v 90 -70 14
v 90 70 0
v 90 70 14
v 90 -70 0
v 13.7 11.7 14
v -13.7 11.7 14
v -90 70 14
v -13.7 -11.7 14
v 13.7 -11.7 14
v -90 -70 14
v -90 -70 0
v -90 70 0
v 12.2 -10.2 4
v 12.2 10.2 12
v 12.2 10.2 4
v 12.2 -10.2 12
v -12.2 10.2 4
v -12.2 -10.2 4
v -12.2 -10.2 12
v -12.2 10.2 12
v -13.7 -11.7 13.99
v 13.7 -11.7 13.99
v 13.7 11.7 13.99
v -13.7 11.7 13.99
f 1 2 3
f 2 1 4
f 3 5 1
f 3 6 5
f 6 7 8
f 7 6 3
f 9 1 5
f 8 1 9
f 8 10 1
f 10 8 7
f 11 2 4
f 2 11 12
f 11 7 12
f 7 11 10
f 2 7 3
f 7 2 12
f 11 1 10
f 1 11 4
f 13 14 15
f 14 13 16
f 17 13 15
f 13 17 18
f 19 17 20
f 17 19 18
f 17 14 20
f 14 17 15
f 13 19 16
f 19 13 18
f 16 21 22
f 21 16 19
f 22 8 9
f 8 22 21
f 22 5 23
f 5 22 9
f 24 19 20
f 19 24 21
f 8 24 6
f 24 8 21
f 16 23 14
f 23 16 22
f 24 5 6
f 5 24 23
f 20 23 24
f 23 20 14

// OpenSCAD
// Headphone stand: base, post, hanger. Units mm. Print orientation = export orientation (+Z up).
part = "base"; // [base, post, hanger, assembly]
cadverify_only = "";

/* Parameters */
base_L = 180; base_W = 140; base_H = 14;
base_sock_L = 24.4; base_sock_W = 20.4; base_sock_D = 10; // depth from top
base_floor = base_H - base_sock_D; // 4
base_cham_H = 2; base_cham_extra = 1.5; // per side funnel

post_low_L = 24; post_low_W = 20; post_low_H = 10;
post_flare_H = 6;
post_shaft_L = 34; post_shaft_W = 28;
post_shaft_bot = post_low_H + post_flare_H; // 16
post_shaft_top = 230;
post_shaft_H = post_shaft_top - post_shaft_bot; // 214
post_up_L = 20; post_up_W = 16; post_up_H = 12;
post_up_cham_H = 1.5; post_up_cham_extra = 1.5; // per side taper at top
post_H = post_shaft_top + post_up_H; // 242

hanger_L = 120; hanger_W = 36; hanger_base_H = 14; hanger_R = 18; // half-cyl radius = W/2
hanger_cyl_H = 18; // cylinder peak 14+18=32
lip_L = 10; lip_W = 36; lip_bot = 14; lip_top = 36; // end stops 14..36
hanger_H = 36;
hanger_sock_L = 20.4; hanger_sock_W = 16.4; hanger_sock_D = 12; // straight depth from bottom
hanger_roof_H = 10; // triangular roof above straight, ridge along X
hanger_cham_H = 2; hanger_cham_extra = 1.5;

asm_post_Z = base_floor; // 4, post bottom in assembly
asm_hanger_Z = 234; // hanger bottom in assembly
// shaft top 230 + post bottom 4 = 234 = hanger bottom; tenon 230..242 -> hanger 0..12; hanger top 234+36=270

module instance(name, part, unit = 1) {
    echo(cadverify_instance = [name, part, unit]);
    if (cadverify_only == "" || cadverify_only == name) children();
}

module base_part() {
    difference() {
        translate([-base_L/2, -base_W/2, 0]) cube([base_L, base_W, base_H]);
        // straight socket
        translate([-base_sock_L/2, -base_sock_W/2, base_floor])
            cube([base_sock_L, base_sock_W, base_sock_D+0.01]);
        // entry funnel (frustum widening upward)
        hull() {
            translate([-base_sock_L/2, -base_sock_W/2, base_H-base_cham_H])
                cube([base_sock_L, base_sock_W, 0.01]);
            translate([-(base_sock_L/2+base_cham_extra), -(base_sock_W/2+base_cham_extra), base_H-0.01])
                cube([base_sock_L+2*base_cham_extra, base_sock_W+2*base_cham_extra, 0.01]);
        }
    }
}

module post_part() {
    // lower tenon (press fit into base)
    translate([-post_low_L/2, -post_low_W/2, 0]) cube([post_low_L, post_low_W, post_low_H]);
    // flare collar 45deg-compatible transition to shaft
    hull() {
        translate([-post_low_L/2, -post_low_W/2, post_low_H-0.01])
            cube([post_low_L, post_low_W, 0.01]);
        translate([-post_shaft_L/2, -post_shaft_W/2, post_shaft_bot-0.01])
            cube([post_shaft_L, post_shaft_W, 0.01]);
    }
    // shaft
    translate([-post_shaft_L/2, -post_shaft_W/2, post_shaft_bot])
        cube([post_shaft_L, post_shaft_W, post_shaft_H]);
    // upper tenon straight part
    translate([-post_up_L/2, -post_up_W/2, post_shaft_top])
        cube([post_up_L, post_up_W, post_up_H-post_up_cham_H]);
    // upper tenon lead chamfer (tapers inward going up)
    hull() {
        translate([-post_up_L/2, -post_up_W/2, post_H-post_up_cham_H-0.01])
            cube([post_up_L, post_up_W, 0.01]);
        translate([-(post_up_L/2-post_up_cham_extra), -(post_up_W/2-post_up_cham_extra), post_H-0.01])
            cube([post_up_L-2*post_up_cham_extra, post_up_W-2*post_up_cham_extra, 0.01]);
    }
}

module hanger_part() {
    difference() {
        union() {
            // base box
            translate([-hanger_L/2, -hanger_W/2, 0]) cube([hanger_L, hanger_W, hanger_base_H]);
            // rounded top: half cylinder along X
            intersection() {
                translate([0, 0, hanger_base_H]) rotate([0, 90, 0])
                    cylinder(r=hanger_R, h=hanger_L, center=true, $fn=128);
                translate([-hanger_L/2, -hanger_W/2, hanger_base_H]) cube([hanger_L, hanger_W, hanger_cyl_H]);
            }
            // end stops (full height from base top, no floating ledge)
            for (sx=[-1,1])
                translate([sx*(hanger_L/2-lip_L), -lip_W/2, lip_bot])
                    cube([lip_L, lip_W, lip_top-lip_bot]);
        }
        // straight socket
        translate([-hanger_sock_L/2, -hanger_sock_W/2, 0])
            cube([hanger_sock_L, hanger_sock_W, hanger_sock_D]);
        // entry funnel at mouth (widens downward)
        hull() {
            translate([-hanger_sock_L/2, -hanger_sock_W/2, hanger_cham_H])
                cube([hanger_sock_L, hanger_sock_W, 0.01]);
            translate([-(hanger_sock_L/2+hanger_cham_extra), -(hanger_sock_W/2+hanger_cham_extra), -0.01])
                cube([hanger_sock_L+2*hanger_cham_extra, hanger_sock_W+2*hanger_cham_extra, 0.01]);
        }
        // pointed roof above straight (ridge along X), self-supporting slopes
        // closed wedge: sharp apex edge, no flat -> no overhang patch
        polyhedron(
            points = [
                [-hanger_sock_L/2, -hanger_sock_W/2, hanger_sock_D-0.1],
                [ hanger_sock_L/2, -hanger_sock_W/2, hanger_sock_D-0.1],
                [ hanger_sock_L/2,  hanger_sock_W/2, hanger_sock_D-0.1],
                [-hanger_sock_L/2,  hanger_sock_W/2, hanger_sock_D-0.1],
                [-hanger_sock_L/2, 0, hanger_sock_D+hanger_roof_H],
                [ hanger_sock_L/2, 0, hanger_sock_D+hanger_roof_H]
            ],
            faces = [
                [0, 1, 2, 3],
                [0, 4, 5, 1],
                [2, 5, 4, 3],
                [0, 3, 4],
                [1, 5, 2]
            ]
        );
    }
}

// --- specs (print coords) ---
if (part == "base") {
    echo(cadverify_spec = [
        ["bounds", [[-base_L/2, -base_W/2, 0], [base_L/2, base_W/2, base_H]]],
        ["bodies", 1],
        ["through_holes", 0],
        ["support_faces", [["base_bottom", "-z", 20000]]],
        ["overhangs_allowed", []],
        ["copies", 1],
        ["details", [
            ["base_plate", "material", [[50, 40, 0], [80, 60, base_H]], 0.9],
            ["socket", "void", [[-base_sock_L/2, -base_sock_W/2, base_floor], [base_sock_L/2, base_sock_W/2, base_H]], 0.9],
            ["socket_funnel", "void", [[-(base_sock_L/2+base_cham_extra), -(base_sock_W/2+base_cham_extra), base_H-base_cham_H], [base_sock_L/2+base_cham_extra, base_sock_W/2+base_cham_extra, base_H]], 0.7],
            ["floor", "thickness", [0, 0, -1], [0, 0, 1], base_floor],
            ["top_face", "view", [[-60, -50, base_H-1], [60, 50, base_H+1]]]
        ]]
    ]);
    base_part();
} else if (part == "post") {
    echo(cadverify_spec = [
        ["bounds", [[-post_shaft_L/2, -post_shaft_W/2, 0], [post_shaft_L/2, post_shaft_W/2, post_H]]],
        ["bodies", 1],
        ["through_holes", 0],
        ["support_faces", [["post_bottom", "-z", 400]]],
        ["overhangs_allowed", []],
        ["copies", 1],
        ["details", [
            ["shaft", "material", [[-10, -8, 60], [10, 8, 160]], 0.9],
            ["lower_tenon", "material", [[-post_low_L/2, -post_low_W/2, 0], [post_low_L/2, post_low_W/2, post_low_H]], 0.9],
            ["upper_tenon", "material", [[-post_up_L/2, -post_up_W/2, post_shaft_top], [post_up_L/2, post_up_W/2, post_H]], 0.8],
            ["collar", "material", [[-14, -12, post_low_H], [14, 12, post_shaft_bot]], 0.7],
            ["shaft_wall", "thickness", [30, 0, 116], [-1, 0, 0], post_shaft_L],
            ["tenon_tip", "view", [[-post_up_L/2, -post_up_W/2, post_H-4], [post_up_L/2, post_up_W/2, post_H+1]]]
        ]]
    ]);
    post_part();
} else if (part == "hanger") {
    echo(cadverify_spec = [
        ["bounds", [[-hanger_L/2, -hanger_W/2, 0], [hanger_L/2, hanger_W/2, hanger_H]]],
        ["bodies", 1],
        ["through_holes", 0],
        ["support_faces", [["hanger_bottom", "-z", 3000]]],
        ["overhangs_allowed", []],
        ["copies", 1],
        ["details", [
            ["saddle", "material", [[-40, -8, 20], [40, 8, 26]], 0.9],
            ["end_stop", "material", [[hanger_L/2-lip_L, -lip_W/2, lip_bot], [hanger_L/2, lip_W/2, lip_top]], 0.9],
            ["socket", "void", [[-hanger_sock_L/2, -hanger_sock_W/2, 0], [hanger_sock_L/2, hanger_sock_W/2, hanger_sock_D]], 0.9],
            ["socket_funnel", "void", [[-(hanger_sock_L/2+hanger_cham_extra), -(hanger_sock_W/2+hanger_cham_extra), 0], [hanger_sock_L/2+hanger_cham_extra, hanger_sock_W/2+hanger_cham_extra, hanger_cham_H]], 0.7],
            ["top_skin", "thickness", [0, 0, hanger_H+4], [0, 0, -1], (hanger_base_H+hanger_cyl_H)-(hanger_sock_D+hanger_roof_H)],
            ["round_top", "view", [[-40, -hanger_W/2, hanger_base_H], [40, hanger_W/2, hanger_base_H+hanger_cyl_H+1]]]
        ]]
    ]);
    hanger_part();
} else if (part == "assembly") {
    echo(cadverify_spec = [
        ["bounds", [[-base_L/2, -base_W/2, 0], [base_L/2, base_W/2, asm_hanger_Z+hanger_H]]],
        ["support_faces", [["desk", "-z", 20000]]],
        ["allowed_interferences", []],
        ["motions", []],
        ["assembly_order", [
            [[ "base_inst" ], [0, 0, 0]],
            [[ "post_inst" ], [0, 0, -1]],
            [[ "hanger_inst" ], [0, 0, -1]]
        ]],
        ["overhangs_allowed", []]
    ]);
    instance("base_inst", "base") base_part();
    instance("post_inst", "post") translate([0, 0, asm_post_Z]) post_part();
    instance("hanger_inst", "hanger") translate([0, 0, asm_hanger_Z]) hanger_part();
}
